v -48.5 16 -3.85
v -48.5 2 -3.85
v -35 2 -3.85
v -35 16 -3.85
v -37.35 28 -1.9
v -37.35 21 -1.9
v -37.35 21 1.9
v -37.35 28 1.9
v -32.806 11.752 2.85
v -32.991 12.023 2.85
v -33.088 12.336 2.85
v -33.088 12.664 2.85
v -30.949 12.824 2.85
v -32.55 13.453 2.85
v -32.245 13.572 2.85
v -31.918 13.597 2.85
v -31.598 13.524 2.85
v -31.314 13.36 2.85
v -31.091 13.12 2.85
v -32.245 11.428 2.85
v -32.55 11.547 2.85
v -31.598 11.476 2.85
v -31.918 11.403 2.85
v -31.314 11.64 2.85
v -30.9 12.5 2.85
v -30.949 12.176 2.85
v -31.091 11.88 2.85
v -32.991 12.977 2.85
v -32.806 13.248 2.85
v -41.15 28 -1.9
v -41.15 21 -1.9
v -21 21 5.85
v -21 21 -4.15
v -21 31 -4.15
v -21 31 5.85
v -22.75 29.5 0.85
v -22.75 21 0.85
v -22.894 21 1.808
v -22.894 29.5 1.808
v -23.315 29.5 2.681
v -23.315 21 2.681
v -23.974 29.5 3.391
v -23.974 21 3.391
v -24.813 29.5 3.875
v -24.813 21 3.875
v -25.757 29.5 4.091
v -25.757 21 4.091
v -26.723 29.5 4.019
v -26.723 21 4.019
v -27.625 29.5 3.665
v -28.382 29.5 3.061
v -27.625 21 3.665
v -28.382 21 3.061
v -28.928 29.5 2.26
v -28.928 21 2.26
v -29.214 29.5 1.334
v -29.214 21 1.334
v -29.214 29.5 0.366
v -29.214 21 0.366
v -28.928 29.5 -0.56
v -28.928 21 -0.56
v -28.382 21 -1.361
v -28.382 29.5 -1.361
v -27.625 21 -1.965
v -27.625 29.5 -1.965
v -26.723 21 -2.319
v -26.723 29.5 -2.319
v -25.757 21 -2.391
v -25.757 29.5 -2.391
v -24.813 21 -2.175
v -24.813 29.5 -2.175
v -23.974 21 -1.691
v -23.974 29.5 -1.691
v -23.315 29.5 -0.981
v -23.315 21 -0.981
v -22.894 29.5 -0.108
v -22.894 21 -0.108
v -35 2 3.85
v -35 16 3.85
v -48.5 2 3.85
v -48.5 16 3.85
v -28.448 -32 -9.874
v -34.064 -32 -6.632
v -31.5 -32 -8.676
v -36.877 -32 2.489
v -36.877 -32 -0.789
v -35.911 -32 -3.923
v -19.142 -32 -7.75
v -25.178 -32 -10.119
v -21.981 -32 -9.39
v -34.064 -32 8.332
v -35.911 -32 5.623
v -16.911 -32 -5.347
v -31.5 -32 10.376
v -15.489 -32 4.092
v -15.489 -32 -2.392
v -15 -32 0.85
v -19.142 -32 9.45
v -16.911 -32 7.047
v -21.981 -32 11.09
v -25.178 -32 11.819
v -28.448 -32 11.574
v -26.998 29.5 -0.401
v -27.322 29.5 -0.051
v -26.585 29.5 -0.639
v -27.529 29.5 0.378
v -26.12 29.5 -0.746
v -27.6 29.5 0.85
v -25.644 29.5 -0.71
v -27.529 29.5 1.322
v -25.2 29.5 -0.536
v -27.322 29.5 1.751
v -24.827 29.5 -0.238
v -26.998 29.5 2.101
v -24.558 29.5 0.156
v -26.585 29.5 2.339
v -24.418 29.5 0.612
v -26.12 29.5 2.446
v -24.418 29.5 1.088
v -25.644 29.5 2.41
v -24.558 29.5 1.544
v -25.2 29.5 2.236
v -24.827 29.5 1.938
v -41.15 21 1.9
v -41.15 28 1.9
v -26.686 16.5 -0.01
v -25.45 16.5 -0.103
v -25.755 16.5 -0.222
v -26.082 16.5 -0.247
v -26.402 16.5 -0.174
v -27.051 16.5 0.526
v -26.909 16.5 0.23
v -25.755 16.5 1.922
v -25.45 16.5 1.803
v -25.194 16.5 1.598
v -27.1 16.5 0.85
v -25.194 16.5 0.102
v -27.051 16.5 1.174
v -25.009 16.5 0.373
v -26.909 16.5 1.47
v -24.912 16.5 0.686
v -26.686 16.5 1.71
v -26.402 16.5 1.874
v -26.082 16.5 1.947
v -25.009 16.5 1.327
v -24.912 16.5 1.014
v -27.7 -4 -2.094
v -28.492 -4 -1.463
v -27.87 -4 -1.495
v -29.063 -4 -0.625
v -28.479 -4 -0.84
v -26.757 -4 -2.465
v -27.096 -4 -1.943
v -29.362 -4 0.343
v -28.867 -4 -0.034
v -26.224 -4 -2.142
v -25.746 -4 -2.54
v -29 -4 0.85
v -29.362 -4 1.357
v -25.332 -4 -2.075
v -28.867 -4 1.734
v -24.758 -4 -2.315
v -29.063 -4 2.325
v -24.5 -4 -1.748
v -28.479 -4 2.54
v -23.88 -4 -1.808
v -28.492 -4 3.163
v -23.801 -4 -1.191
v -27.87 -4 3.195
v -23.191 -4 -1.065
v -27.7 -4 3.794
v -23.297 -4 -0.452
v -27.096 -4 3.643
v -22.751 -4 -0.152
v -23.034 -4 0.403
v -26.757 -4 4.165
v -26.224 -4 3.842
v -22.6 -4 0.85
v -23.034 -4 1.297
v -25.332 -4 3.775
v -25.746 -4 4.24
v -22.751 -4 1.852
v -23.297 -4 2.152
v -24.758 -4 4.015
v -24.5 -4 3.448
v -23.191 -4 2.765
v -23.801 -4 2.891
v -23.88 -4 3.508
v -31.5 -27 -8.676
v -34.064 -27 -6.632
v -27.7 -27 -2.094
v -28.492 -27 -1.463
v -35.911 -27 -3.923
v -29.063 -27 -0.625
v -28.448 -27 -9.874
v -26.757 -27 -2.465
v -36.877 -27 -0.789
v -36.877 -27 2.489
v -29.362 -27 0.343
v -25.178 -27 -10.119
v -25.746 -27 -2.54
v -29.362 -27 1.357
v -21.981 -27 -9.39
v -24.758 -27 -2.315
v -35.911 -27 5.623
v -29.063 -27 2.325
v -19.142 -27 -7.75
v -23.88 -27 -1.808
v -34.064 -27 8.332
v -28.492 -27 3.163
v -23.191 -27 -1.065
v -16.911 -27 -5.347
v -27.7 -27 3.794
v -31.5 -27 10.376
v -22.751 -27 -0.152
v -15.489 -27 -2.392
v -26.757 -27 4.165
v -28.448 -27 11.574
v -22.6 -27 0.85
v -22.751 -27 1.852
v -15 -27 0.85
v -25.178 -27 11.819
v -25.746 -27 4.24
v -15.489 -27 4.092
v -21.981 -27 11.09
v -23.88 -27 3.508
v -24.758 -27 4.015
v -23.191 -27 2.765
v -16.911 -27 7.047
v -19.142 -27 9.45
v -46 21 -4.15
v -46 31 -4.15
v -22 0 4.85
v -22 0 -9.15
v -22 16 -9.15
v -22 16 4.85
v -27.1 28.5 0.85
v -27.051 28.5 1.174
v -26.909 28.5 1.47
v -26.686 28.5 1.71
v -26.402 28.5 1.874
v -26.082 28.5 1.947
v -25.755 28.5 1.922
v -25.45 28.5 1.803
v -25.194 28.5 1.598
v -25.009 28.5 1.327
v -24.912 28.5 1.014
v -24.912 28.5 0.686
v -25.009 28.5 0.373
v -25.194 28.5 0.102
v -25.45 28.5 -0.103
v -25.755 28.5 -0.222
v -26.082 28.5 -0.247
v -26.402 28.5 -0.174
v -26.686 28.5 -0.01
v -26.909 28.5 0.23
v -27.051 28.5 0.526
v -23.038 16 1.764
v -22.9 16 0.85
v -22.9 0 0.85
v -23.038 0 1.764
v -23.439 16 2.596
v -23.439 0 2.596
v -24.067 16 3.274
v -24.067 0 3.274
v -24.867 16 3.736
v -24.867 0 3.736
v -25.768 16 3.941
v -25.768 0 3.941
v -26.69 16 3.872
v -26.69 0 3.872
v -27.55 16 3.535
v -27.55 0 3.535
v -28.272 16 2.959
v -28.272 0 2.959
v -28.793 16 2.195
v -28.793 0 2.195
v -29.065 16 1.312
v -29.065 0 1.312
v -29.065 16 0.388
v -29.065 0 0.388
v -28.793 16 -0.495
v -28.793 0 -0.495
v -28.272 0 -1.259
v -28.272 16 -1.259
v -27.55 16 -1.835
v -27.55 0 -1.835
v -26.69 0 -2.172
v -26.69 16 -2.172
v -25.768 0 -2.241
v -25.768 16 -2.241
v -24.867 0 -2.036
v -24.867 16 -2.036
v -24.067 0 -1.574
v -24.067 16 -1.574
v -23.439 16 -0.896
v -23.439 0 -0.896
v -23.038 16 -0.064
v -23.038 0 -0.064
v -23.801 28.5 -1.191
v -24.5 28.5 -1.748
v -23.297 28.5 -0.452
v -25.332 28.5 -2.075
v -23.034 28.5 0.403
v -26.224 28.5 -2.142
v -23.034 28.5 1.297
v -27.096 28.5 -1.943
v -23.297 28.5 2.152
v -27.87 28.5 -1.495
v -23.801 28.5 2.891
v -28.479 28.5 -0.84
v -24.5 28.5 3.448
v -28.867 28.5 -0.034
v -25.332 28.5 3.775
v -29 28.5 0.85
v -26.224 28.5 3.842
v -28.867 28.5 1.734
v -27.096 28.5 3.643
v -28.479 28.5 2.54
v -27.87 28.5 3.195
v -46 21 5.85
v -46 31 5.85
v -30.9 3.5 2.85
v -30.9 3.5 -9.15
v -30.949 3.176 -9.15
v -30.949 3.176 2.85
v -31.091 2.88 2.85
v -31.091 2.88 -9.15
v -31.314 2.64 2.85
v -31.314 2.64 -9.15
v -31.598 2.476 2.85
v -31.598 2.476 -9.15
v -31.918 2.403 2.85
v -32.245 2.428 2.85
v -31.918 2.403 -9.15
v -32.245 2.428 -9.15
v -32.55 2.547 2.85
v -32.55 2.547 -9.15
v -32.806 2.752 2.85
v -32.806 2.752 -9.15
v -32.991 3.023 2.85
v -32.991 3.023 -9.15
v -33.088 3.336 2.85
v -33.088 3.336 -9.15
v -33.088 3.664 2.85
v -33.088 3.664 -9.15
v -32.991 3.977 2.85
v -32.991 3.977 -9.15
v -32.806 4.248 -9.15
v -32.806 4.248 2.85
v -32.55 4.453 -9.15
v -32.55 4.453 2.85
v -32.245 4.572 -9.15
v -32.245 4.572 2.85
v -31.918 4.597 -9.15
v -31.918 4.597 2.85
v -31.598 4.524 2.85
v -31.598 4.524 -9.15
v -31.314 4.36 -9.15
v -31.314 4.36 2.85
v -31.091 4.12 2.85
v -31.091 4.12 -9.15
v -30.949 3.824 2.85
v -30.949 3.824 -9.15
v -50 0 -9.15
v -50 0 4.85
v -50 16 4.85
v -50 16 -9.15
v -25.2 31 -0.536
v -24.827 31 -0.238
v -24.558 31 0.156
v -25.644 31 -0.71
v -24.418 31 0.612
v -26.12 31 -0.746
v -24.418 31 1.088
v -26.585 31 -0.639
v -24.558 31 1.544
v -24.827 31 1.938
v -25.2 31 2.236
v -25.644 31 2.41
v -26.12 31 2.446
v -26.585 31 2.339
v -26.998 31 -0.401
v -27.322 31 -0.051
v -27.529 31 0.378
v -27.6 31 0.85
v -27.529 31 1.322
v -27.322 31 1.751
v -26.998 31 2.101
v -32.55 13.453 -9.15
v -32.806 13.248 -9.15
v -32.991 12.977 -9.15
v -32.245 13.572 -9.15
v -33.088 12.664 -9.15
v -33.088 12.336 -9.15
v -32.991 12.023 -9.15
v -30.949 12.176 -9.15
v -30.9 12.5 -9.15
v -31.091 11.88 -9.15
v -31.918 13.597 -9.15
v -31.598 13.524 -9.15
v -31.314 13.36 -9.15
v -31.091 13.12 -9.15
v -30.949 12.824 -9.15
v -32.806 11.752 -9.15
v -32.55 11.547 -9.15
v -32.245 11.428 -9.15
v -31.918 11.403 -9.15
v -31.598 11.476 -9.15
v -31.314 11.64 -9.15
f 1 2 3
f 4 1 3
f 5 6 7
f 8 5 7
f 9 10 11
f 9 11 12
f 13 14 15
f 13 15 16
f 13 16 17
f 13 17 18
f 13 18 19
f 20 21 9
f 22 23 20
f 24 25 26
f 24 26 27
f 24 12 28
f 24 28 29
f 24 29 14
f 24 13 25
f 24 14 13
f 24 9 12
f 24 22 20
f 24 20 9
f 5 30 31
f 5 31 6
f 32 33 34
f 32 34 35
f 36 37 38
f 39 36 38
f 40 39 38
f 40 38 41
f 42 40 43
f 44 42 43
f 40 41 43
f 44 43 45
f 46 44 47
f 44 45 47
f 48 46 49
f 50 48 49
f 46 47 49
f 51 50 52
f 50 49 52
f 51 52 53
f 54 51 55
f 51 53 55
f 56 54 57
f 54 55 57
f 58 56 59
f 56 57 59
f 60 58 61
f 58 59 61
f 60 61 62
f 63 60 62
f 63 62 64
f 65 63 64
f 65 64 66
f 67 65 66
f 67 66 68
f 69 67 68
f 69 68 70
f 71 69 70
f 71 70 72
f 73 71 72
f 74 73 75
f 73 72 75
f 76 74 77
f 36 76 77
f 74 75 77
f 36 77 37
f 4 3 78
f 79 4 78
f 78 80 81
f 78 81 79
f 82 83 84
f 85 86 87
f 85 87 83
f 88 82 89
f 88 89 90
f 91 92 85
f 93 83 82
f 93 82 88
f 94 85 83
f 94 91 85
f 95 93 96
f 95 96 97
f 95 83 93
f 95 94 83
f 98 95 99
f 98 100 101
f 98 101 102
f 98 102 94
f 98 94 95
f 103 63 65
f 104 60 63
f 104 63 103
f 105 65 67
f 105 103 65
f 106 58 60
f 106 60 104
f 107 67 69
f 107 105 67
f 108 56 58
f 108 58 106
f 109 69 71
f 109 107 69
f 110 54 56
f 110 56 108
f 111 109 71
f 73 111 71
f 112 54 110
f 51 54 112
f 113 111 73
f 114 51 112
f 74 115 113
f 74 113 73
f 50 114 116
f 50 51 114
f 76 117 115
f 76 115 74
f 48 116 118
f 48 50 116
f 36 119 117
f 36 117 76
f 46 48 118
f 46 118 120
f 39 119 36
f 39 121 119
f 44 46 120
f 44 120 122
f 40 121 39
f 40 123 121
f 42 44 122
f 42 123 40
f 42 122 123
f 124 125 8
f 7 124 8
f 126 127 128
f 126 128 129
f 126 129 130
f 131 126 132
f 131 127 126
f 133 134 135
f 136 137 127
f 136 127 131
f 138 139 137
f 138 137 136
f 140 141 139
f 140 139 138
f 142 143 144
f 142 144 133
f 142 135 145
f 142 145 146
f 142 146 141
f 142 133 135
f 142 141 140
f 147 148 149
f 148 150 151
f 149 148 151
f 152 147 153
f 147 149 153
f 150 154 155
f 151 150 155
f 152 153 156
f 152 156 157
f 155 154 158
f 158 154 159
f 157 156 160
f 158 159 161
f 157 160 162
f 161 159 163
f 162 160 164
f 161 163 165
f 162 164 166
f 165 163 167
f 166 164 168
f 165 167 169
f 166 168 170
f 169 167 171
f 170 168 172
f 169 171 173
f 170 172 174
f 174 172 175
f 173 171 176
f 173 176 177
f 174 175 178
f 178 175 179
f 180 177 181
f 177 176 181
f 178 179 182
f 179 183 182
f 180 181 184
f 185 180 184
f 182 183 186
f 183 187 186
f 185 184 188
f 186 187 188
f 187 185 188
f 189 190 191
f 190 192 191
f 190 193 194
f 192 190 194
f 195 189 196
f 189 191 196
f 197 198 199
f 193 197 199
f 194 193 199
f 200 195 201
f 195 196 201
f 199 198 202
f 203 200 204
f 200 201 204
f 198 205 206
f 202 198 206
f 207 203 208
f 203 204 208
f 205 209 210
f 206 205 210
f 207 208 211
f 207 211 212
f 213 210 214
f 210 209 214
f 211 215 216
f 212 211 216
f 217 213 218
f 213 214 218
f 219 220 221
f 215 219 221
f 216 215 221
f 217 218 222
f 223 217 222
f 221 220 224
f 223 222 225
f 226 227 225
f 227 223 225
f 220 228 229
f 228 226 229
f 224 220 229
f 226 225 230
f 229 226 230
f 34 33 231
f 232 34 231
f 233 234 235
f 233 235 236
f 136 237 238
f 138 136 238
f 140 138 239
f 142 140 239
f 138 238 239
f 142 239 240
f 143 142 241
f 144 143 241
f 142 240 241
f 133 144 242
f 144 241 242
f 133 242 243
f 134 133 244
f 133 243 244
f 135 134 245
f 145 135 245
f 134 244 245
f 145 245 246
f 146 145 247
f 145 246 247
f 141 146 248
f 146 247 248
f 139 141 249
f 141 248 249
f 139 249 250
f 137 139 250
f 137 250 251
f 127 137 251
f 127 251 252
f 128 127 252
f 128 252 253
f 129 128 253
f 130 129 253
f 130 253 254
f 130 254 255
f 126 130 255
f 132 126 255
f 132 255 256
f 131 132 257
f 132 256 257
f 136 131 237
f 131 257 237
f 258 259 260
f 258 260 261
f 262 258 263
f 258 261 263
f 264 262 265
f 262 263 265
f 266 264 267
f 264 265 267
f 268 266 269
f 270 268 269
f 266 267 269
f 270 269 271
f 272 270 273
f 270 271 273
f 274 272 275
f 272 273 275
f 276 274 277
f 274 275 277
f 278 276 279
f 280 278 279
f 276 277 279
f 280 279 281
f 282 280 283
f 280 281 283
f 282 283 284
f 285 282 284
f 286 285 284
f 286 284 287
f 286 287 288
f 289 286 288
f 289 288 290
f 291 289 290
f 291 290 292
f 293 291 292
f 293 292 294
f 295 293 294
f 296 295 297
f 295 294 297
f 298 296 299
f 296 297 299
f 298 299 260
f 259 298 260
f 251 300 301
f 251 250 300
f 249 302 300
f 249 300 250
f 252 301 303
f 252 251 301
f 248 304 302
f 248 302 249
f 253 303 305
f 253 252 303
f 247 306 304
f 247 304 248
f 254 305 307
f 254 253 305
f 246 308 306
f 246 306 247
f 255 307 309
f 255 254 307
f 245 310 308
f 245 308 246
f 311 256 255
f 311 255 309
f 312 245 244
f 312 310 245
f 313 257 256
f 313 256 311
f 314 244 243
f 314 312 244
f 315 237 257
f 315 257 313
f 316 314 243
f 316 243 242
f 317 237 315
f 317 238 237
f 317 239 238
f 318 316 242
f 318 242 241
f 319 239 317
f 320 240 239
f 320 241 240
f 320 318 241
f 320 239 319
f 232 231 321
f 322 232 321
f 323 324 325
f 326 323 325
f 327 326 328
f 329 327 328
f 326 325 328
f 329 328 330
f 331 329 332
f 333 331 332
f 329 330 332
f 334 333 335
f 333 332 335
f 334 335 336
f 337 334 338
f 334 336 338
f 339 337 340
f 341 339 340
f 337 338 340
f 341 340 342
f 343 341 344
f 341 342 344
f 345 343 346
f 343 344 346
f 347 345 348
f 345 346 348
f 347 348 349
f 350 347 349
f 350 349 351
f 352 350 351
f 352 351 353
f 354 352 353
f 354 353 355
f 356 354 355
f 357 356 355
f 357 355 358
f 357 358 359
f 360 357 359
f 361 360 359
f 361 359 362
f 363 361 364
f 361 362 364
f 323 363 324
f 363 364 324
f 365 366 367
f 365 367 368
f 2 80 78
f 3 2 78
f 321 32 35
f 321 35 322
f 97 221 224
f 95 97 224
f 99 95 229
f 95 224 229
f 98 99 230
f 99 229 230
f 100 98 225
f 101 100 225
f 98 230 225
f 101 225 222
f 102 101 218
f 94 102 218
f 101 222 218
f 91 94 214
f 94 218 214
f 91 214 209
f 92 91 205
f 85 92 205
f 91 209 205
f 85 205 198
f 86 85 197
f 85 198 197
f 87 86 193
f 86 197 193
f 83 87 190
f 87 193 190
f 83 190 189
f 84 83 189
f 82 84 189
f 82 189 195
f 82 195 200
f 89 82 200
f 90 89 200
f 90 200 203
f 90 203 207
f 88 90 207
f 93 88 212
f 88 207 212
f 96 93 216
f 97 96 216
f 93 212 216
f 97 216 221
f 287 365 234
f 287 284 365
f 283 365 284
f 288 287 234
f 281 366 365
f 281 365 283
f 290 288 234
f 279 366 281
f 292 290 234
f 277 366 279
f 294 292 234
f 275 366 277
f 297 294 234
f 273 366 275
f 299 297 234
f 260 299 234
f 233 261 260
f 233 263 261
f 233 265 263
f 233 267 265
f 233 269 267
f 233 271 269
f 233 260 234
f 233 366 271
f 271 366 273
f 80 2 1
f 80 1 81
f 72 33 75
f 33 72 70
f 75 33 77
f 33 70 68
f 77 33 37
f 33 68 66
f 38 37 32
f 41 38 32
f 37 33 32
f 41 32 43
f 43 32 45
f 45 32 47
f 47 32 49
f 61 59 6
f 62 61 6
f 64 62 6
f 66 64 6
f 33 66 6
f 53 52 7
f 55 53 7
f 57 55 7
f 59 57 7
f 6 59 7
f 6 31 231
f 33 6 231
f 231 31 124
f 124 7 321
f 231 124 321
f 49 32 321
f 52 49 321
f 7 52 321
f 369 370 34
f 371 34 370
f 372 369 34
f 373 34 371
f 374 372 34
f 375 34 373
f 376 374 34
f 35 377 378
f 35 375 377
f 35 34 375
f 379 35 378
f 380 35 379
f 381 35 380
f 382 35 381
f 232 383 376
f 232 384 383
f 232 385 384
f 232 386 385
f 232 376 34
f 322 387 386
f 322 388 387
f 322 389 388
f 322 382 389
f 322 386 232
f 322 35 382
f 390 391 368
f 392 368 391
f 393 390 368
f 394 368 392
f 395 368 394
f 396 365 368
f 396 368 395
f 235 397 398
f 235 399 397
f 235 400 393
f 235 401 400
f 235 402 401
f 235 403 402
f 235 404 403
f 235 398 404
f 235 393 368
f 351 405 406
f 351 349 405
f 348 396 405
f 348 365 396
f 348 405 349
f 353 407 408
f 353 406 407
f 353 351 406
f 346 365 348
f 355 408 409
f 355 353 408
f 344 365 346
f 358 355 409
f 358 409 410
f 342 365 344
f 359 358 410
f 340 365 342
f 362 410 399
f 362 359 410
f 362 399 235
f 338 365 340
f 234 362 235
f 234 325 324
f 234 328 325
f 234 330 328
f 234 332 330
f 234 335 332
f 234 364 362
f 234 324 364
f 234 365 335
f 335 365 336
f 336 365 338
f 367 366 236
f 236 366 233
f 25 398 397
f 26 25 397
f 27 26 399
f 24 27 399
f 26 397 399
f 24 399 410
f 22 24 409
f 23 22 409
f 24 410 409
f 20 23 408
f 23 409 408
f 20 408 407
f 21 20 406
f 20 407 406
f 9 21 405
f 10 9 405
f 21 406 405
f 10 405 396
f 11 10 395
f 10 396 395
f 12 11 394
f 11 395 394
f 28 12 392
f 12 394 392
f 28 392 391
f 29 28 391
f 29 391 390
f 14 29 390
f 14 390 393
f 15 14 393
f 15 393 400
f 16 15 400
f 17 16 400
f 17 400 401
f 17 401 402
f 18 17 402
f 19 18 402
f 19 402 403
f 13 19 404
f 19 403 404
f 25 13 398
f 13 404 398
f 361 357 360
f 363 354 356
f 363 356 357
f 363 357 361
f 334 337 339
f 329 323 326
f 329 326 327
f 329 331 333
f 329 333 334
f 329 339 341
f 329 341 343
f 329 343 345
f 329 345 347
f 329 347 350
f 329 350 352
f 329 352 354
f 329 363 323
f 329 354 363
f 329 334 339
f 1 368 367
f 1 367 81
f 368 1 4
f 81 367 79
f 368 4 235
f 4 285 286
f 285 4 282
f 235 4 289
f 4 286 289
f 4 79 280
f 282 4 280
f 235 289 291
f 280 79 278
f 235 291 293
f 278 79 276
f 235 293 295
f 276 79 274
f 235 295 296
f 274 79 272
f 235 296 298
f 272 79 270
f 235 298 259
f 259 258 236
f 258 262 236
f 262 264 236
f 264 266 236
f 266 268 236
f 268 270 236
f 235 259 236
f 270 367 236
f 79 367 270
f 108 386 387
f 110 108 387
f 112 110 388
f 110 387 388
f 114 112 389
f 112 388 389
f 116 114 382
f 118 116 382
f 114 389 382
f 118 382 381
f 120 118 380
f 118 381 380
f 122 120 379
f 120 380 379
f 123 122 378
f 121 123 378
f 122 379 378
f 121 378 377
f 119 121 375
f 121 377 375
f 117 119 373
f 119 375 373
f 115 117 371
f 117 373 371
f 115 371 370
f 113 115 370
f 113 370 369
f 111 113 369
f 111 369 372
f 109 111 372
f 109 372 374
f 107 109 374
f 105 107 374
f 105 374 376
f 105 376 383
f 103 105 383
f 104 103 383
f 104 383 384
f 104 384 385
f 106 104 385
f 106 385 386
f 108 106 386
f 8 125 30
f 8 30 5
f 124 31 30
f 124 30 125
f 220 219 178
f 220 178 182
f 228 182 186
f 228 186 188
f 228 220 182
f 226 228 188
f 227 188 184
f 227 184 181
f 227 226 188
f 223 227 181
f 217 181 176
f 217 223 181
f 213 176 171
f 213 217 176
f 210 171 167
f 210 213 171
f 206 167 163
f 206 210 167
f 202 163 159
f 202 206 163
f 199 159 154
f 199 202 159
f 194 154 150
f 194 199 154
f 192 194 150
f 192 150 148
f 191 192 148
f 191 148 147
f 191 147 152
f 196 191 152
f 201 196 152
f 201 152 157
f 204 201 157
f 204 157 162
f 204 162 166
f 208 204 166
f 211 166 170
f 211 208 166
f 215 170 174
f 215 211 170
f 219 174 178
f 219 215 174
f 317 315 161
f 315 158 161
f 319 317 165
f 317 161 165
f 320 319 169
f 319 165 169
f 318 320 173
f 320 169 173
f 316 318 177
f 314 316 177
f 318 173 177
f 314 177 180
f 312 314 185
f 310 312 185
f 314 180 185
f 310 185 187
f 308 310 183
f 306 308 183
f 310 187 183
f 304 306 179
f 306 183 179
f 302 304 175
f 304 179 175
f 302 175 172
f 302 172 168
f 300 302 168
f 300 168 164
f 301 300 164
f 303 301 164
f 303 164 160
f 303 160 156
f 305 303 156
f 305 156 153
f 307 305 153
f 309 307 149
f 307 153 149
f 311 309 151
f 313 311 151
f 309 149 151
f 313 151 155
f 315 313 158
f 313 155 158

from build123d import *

# Parameters (mm, degrees)
F0_W      = 28
F0_H      = 4.3
F0_H_2    = 9.7
F0_W_2    = 13.5
F0_H_3    = 7.7
F0_R      = 3.1
F1_DEPTH  = 16
F2_W      = 13.5
F2_H      = 7.7
F3_DEPTH  = 2
F4_R      = 1.1
F5_DEPTH  = 12
F8_R      = 11
F9_DEPTH  = 5
F10_R     = 3
F11_DEPTH = 48
F12_W     = 25
F12_H     = 10
F13_DEPTH = 10
F14_W     = 3.8
F14_H     = 3.8
F15_DEPTH = 7
F14_R     = 3.25
F16_DEPTH = 8.5
F17_R     = 3.4
F18_DEPTH = 23
F19_R     = 3
F20_DEPTH = 7.5
F21_R     = 1.1
F22_DEPTH = 12
F23_R     = 1.6
F24_DEPTH = 25


with BuildPart() as f1:
    # F0 (on Front) → F1 (new body)
    with BuildSketch(Plane.XZ):
        with Locations((-36, -7)):
            Rectangle(F0_W, F0_H)
        with Locations((-36, 0)):
            Rectangle(F0_W, F0_H_2)
        with Locations((-41.75, 0)):
            Rectangle(F0_W_2, F0_H_3, mode=Mode.SUBTRACT)
        with Locations((-26, 0.85)):
            Circle(F0_R, mode=Mode.SUBTRACT)
    extrude(amount=-F1_DEPTH)

    # F2 (on face) → F3 (join)
    with BuildSketch(Plane.XZ):
        with Locations((-41.75, 0)):
            Rectangle(F2_W, F2_H)
    extrude(amount=-F3_DEPTH)

    # F4 (on face) → F5 (cut)
    with BuildSketch(Plane(origin=(0, 0, -9.15), x_dir=(1, 0, 0), z_dir=(0, 0, -1))):
        with Locations((-32, -3.5)):
            Circle(F4_R)
        with Locations((-32, -12.5)):
            Circle(F4_R)
    extrude(amount=-F5_DEPTH, mode=Mode.SUBTRACT)


with BuildPart() as f9:
    # F8 (on offset) → F9 (new body)
    with BuildSketch(Plane.XZ.offset(27)):
        with Locations((-26, 0.85)):
            Circle(F8_R)
    extrude(amount=F9_DEPTH)

    # F10 (on face) → F11 (join)
    with BuildSketch(Plane(origin=(0, -27, 0), x_dir=(-1, 0, 0), z_dir=(0, 1, 0))):
        with Locations((26, 0.85)):
            Circle(F10_R)
    extrude(amount=F11_DEPTH)

    # F17 (on face) → F18 (join)
    with BuildSketch(Plane.XZ.offset(27)):
        with Locations((-26, 0.85)):
            Circle(F17_R)
    extrude(amount=-F18_DEPTH)

    # F19 (on face) → F20 (join)
    with BuildSketch(Plane(origin=(0, 21, 0), x_dir=(-1, 0, 0), z_dir=(0, 1, 0))):
        with Locations((26, 0.85)):
            Circle(F19_R)
    extrude(amount=F20_DEPTH)

    # F21 (on face) → F22 (cut)
    with BuildSketch(Plane(origin=(0, 28.5, 0), x_dir=(-1, 0, 0), z_dir=(0, 1, 0))):
        with Locations((26, 0.85)):
            Circle(F21_R)
    extrude(amount=-F22_DEPTH, mode=Mode.SUBTRACT)


with BuildPart() as f13:
    # F12 (on offset) → F13 (new body)
    with BuildSketch(Plane(origin=(0, 21, 0), x_dir=(-1, 0, 0), z_dir=(0, 1, 0))):
        with Locations((33.5, 0.85)):
            Rectangle(F12_W, F12_H)
    extrude(amount=F13_DEPTH)

    # F14 (on face) → F15 (cut)
    with BuildSketch(Plane.XZ.offset(-21)):
        with Locations((-39.25, 0)):
            Rectangle(F14_W, F14_H)
    extrude(amount=-F15_DEPTH, mode=Mode.SUBTRACT)

    # F14 (on face) → F16 (cut)
    with BuildSketch(Plane.XZ.offset(-21)):
        with Locations((-26, 0.85)):
            Circle(F14_R)
    extrude(amount=-F16_DEPTH, mode=Mode.SUBTRACT)

    # F23 (on face) → F24 (cut)
    with BuildSketch(Plane(origin=(0, 31, 0), x_dir=(-1, 0, 0), z_dir=(0, 1, 0))):
        with Locations((26, 0.85)):
            Circle(F23_R)
    extrude(amount=-F24_DEPTH, mode=Mode.SUBTRACT)


solid = Compound([f1.part, f9.part, f13.part])
